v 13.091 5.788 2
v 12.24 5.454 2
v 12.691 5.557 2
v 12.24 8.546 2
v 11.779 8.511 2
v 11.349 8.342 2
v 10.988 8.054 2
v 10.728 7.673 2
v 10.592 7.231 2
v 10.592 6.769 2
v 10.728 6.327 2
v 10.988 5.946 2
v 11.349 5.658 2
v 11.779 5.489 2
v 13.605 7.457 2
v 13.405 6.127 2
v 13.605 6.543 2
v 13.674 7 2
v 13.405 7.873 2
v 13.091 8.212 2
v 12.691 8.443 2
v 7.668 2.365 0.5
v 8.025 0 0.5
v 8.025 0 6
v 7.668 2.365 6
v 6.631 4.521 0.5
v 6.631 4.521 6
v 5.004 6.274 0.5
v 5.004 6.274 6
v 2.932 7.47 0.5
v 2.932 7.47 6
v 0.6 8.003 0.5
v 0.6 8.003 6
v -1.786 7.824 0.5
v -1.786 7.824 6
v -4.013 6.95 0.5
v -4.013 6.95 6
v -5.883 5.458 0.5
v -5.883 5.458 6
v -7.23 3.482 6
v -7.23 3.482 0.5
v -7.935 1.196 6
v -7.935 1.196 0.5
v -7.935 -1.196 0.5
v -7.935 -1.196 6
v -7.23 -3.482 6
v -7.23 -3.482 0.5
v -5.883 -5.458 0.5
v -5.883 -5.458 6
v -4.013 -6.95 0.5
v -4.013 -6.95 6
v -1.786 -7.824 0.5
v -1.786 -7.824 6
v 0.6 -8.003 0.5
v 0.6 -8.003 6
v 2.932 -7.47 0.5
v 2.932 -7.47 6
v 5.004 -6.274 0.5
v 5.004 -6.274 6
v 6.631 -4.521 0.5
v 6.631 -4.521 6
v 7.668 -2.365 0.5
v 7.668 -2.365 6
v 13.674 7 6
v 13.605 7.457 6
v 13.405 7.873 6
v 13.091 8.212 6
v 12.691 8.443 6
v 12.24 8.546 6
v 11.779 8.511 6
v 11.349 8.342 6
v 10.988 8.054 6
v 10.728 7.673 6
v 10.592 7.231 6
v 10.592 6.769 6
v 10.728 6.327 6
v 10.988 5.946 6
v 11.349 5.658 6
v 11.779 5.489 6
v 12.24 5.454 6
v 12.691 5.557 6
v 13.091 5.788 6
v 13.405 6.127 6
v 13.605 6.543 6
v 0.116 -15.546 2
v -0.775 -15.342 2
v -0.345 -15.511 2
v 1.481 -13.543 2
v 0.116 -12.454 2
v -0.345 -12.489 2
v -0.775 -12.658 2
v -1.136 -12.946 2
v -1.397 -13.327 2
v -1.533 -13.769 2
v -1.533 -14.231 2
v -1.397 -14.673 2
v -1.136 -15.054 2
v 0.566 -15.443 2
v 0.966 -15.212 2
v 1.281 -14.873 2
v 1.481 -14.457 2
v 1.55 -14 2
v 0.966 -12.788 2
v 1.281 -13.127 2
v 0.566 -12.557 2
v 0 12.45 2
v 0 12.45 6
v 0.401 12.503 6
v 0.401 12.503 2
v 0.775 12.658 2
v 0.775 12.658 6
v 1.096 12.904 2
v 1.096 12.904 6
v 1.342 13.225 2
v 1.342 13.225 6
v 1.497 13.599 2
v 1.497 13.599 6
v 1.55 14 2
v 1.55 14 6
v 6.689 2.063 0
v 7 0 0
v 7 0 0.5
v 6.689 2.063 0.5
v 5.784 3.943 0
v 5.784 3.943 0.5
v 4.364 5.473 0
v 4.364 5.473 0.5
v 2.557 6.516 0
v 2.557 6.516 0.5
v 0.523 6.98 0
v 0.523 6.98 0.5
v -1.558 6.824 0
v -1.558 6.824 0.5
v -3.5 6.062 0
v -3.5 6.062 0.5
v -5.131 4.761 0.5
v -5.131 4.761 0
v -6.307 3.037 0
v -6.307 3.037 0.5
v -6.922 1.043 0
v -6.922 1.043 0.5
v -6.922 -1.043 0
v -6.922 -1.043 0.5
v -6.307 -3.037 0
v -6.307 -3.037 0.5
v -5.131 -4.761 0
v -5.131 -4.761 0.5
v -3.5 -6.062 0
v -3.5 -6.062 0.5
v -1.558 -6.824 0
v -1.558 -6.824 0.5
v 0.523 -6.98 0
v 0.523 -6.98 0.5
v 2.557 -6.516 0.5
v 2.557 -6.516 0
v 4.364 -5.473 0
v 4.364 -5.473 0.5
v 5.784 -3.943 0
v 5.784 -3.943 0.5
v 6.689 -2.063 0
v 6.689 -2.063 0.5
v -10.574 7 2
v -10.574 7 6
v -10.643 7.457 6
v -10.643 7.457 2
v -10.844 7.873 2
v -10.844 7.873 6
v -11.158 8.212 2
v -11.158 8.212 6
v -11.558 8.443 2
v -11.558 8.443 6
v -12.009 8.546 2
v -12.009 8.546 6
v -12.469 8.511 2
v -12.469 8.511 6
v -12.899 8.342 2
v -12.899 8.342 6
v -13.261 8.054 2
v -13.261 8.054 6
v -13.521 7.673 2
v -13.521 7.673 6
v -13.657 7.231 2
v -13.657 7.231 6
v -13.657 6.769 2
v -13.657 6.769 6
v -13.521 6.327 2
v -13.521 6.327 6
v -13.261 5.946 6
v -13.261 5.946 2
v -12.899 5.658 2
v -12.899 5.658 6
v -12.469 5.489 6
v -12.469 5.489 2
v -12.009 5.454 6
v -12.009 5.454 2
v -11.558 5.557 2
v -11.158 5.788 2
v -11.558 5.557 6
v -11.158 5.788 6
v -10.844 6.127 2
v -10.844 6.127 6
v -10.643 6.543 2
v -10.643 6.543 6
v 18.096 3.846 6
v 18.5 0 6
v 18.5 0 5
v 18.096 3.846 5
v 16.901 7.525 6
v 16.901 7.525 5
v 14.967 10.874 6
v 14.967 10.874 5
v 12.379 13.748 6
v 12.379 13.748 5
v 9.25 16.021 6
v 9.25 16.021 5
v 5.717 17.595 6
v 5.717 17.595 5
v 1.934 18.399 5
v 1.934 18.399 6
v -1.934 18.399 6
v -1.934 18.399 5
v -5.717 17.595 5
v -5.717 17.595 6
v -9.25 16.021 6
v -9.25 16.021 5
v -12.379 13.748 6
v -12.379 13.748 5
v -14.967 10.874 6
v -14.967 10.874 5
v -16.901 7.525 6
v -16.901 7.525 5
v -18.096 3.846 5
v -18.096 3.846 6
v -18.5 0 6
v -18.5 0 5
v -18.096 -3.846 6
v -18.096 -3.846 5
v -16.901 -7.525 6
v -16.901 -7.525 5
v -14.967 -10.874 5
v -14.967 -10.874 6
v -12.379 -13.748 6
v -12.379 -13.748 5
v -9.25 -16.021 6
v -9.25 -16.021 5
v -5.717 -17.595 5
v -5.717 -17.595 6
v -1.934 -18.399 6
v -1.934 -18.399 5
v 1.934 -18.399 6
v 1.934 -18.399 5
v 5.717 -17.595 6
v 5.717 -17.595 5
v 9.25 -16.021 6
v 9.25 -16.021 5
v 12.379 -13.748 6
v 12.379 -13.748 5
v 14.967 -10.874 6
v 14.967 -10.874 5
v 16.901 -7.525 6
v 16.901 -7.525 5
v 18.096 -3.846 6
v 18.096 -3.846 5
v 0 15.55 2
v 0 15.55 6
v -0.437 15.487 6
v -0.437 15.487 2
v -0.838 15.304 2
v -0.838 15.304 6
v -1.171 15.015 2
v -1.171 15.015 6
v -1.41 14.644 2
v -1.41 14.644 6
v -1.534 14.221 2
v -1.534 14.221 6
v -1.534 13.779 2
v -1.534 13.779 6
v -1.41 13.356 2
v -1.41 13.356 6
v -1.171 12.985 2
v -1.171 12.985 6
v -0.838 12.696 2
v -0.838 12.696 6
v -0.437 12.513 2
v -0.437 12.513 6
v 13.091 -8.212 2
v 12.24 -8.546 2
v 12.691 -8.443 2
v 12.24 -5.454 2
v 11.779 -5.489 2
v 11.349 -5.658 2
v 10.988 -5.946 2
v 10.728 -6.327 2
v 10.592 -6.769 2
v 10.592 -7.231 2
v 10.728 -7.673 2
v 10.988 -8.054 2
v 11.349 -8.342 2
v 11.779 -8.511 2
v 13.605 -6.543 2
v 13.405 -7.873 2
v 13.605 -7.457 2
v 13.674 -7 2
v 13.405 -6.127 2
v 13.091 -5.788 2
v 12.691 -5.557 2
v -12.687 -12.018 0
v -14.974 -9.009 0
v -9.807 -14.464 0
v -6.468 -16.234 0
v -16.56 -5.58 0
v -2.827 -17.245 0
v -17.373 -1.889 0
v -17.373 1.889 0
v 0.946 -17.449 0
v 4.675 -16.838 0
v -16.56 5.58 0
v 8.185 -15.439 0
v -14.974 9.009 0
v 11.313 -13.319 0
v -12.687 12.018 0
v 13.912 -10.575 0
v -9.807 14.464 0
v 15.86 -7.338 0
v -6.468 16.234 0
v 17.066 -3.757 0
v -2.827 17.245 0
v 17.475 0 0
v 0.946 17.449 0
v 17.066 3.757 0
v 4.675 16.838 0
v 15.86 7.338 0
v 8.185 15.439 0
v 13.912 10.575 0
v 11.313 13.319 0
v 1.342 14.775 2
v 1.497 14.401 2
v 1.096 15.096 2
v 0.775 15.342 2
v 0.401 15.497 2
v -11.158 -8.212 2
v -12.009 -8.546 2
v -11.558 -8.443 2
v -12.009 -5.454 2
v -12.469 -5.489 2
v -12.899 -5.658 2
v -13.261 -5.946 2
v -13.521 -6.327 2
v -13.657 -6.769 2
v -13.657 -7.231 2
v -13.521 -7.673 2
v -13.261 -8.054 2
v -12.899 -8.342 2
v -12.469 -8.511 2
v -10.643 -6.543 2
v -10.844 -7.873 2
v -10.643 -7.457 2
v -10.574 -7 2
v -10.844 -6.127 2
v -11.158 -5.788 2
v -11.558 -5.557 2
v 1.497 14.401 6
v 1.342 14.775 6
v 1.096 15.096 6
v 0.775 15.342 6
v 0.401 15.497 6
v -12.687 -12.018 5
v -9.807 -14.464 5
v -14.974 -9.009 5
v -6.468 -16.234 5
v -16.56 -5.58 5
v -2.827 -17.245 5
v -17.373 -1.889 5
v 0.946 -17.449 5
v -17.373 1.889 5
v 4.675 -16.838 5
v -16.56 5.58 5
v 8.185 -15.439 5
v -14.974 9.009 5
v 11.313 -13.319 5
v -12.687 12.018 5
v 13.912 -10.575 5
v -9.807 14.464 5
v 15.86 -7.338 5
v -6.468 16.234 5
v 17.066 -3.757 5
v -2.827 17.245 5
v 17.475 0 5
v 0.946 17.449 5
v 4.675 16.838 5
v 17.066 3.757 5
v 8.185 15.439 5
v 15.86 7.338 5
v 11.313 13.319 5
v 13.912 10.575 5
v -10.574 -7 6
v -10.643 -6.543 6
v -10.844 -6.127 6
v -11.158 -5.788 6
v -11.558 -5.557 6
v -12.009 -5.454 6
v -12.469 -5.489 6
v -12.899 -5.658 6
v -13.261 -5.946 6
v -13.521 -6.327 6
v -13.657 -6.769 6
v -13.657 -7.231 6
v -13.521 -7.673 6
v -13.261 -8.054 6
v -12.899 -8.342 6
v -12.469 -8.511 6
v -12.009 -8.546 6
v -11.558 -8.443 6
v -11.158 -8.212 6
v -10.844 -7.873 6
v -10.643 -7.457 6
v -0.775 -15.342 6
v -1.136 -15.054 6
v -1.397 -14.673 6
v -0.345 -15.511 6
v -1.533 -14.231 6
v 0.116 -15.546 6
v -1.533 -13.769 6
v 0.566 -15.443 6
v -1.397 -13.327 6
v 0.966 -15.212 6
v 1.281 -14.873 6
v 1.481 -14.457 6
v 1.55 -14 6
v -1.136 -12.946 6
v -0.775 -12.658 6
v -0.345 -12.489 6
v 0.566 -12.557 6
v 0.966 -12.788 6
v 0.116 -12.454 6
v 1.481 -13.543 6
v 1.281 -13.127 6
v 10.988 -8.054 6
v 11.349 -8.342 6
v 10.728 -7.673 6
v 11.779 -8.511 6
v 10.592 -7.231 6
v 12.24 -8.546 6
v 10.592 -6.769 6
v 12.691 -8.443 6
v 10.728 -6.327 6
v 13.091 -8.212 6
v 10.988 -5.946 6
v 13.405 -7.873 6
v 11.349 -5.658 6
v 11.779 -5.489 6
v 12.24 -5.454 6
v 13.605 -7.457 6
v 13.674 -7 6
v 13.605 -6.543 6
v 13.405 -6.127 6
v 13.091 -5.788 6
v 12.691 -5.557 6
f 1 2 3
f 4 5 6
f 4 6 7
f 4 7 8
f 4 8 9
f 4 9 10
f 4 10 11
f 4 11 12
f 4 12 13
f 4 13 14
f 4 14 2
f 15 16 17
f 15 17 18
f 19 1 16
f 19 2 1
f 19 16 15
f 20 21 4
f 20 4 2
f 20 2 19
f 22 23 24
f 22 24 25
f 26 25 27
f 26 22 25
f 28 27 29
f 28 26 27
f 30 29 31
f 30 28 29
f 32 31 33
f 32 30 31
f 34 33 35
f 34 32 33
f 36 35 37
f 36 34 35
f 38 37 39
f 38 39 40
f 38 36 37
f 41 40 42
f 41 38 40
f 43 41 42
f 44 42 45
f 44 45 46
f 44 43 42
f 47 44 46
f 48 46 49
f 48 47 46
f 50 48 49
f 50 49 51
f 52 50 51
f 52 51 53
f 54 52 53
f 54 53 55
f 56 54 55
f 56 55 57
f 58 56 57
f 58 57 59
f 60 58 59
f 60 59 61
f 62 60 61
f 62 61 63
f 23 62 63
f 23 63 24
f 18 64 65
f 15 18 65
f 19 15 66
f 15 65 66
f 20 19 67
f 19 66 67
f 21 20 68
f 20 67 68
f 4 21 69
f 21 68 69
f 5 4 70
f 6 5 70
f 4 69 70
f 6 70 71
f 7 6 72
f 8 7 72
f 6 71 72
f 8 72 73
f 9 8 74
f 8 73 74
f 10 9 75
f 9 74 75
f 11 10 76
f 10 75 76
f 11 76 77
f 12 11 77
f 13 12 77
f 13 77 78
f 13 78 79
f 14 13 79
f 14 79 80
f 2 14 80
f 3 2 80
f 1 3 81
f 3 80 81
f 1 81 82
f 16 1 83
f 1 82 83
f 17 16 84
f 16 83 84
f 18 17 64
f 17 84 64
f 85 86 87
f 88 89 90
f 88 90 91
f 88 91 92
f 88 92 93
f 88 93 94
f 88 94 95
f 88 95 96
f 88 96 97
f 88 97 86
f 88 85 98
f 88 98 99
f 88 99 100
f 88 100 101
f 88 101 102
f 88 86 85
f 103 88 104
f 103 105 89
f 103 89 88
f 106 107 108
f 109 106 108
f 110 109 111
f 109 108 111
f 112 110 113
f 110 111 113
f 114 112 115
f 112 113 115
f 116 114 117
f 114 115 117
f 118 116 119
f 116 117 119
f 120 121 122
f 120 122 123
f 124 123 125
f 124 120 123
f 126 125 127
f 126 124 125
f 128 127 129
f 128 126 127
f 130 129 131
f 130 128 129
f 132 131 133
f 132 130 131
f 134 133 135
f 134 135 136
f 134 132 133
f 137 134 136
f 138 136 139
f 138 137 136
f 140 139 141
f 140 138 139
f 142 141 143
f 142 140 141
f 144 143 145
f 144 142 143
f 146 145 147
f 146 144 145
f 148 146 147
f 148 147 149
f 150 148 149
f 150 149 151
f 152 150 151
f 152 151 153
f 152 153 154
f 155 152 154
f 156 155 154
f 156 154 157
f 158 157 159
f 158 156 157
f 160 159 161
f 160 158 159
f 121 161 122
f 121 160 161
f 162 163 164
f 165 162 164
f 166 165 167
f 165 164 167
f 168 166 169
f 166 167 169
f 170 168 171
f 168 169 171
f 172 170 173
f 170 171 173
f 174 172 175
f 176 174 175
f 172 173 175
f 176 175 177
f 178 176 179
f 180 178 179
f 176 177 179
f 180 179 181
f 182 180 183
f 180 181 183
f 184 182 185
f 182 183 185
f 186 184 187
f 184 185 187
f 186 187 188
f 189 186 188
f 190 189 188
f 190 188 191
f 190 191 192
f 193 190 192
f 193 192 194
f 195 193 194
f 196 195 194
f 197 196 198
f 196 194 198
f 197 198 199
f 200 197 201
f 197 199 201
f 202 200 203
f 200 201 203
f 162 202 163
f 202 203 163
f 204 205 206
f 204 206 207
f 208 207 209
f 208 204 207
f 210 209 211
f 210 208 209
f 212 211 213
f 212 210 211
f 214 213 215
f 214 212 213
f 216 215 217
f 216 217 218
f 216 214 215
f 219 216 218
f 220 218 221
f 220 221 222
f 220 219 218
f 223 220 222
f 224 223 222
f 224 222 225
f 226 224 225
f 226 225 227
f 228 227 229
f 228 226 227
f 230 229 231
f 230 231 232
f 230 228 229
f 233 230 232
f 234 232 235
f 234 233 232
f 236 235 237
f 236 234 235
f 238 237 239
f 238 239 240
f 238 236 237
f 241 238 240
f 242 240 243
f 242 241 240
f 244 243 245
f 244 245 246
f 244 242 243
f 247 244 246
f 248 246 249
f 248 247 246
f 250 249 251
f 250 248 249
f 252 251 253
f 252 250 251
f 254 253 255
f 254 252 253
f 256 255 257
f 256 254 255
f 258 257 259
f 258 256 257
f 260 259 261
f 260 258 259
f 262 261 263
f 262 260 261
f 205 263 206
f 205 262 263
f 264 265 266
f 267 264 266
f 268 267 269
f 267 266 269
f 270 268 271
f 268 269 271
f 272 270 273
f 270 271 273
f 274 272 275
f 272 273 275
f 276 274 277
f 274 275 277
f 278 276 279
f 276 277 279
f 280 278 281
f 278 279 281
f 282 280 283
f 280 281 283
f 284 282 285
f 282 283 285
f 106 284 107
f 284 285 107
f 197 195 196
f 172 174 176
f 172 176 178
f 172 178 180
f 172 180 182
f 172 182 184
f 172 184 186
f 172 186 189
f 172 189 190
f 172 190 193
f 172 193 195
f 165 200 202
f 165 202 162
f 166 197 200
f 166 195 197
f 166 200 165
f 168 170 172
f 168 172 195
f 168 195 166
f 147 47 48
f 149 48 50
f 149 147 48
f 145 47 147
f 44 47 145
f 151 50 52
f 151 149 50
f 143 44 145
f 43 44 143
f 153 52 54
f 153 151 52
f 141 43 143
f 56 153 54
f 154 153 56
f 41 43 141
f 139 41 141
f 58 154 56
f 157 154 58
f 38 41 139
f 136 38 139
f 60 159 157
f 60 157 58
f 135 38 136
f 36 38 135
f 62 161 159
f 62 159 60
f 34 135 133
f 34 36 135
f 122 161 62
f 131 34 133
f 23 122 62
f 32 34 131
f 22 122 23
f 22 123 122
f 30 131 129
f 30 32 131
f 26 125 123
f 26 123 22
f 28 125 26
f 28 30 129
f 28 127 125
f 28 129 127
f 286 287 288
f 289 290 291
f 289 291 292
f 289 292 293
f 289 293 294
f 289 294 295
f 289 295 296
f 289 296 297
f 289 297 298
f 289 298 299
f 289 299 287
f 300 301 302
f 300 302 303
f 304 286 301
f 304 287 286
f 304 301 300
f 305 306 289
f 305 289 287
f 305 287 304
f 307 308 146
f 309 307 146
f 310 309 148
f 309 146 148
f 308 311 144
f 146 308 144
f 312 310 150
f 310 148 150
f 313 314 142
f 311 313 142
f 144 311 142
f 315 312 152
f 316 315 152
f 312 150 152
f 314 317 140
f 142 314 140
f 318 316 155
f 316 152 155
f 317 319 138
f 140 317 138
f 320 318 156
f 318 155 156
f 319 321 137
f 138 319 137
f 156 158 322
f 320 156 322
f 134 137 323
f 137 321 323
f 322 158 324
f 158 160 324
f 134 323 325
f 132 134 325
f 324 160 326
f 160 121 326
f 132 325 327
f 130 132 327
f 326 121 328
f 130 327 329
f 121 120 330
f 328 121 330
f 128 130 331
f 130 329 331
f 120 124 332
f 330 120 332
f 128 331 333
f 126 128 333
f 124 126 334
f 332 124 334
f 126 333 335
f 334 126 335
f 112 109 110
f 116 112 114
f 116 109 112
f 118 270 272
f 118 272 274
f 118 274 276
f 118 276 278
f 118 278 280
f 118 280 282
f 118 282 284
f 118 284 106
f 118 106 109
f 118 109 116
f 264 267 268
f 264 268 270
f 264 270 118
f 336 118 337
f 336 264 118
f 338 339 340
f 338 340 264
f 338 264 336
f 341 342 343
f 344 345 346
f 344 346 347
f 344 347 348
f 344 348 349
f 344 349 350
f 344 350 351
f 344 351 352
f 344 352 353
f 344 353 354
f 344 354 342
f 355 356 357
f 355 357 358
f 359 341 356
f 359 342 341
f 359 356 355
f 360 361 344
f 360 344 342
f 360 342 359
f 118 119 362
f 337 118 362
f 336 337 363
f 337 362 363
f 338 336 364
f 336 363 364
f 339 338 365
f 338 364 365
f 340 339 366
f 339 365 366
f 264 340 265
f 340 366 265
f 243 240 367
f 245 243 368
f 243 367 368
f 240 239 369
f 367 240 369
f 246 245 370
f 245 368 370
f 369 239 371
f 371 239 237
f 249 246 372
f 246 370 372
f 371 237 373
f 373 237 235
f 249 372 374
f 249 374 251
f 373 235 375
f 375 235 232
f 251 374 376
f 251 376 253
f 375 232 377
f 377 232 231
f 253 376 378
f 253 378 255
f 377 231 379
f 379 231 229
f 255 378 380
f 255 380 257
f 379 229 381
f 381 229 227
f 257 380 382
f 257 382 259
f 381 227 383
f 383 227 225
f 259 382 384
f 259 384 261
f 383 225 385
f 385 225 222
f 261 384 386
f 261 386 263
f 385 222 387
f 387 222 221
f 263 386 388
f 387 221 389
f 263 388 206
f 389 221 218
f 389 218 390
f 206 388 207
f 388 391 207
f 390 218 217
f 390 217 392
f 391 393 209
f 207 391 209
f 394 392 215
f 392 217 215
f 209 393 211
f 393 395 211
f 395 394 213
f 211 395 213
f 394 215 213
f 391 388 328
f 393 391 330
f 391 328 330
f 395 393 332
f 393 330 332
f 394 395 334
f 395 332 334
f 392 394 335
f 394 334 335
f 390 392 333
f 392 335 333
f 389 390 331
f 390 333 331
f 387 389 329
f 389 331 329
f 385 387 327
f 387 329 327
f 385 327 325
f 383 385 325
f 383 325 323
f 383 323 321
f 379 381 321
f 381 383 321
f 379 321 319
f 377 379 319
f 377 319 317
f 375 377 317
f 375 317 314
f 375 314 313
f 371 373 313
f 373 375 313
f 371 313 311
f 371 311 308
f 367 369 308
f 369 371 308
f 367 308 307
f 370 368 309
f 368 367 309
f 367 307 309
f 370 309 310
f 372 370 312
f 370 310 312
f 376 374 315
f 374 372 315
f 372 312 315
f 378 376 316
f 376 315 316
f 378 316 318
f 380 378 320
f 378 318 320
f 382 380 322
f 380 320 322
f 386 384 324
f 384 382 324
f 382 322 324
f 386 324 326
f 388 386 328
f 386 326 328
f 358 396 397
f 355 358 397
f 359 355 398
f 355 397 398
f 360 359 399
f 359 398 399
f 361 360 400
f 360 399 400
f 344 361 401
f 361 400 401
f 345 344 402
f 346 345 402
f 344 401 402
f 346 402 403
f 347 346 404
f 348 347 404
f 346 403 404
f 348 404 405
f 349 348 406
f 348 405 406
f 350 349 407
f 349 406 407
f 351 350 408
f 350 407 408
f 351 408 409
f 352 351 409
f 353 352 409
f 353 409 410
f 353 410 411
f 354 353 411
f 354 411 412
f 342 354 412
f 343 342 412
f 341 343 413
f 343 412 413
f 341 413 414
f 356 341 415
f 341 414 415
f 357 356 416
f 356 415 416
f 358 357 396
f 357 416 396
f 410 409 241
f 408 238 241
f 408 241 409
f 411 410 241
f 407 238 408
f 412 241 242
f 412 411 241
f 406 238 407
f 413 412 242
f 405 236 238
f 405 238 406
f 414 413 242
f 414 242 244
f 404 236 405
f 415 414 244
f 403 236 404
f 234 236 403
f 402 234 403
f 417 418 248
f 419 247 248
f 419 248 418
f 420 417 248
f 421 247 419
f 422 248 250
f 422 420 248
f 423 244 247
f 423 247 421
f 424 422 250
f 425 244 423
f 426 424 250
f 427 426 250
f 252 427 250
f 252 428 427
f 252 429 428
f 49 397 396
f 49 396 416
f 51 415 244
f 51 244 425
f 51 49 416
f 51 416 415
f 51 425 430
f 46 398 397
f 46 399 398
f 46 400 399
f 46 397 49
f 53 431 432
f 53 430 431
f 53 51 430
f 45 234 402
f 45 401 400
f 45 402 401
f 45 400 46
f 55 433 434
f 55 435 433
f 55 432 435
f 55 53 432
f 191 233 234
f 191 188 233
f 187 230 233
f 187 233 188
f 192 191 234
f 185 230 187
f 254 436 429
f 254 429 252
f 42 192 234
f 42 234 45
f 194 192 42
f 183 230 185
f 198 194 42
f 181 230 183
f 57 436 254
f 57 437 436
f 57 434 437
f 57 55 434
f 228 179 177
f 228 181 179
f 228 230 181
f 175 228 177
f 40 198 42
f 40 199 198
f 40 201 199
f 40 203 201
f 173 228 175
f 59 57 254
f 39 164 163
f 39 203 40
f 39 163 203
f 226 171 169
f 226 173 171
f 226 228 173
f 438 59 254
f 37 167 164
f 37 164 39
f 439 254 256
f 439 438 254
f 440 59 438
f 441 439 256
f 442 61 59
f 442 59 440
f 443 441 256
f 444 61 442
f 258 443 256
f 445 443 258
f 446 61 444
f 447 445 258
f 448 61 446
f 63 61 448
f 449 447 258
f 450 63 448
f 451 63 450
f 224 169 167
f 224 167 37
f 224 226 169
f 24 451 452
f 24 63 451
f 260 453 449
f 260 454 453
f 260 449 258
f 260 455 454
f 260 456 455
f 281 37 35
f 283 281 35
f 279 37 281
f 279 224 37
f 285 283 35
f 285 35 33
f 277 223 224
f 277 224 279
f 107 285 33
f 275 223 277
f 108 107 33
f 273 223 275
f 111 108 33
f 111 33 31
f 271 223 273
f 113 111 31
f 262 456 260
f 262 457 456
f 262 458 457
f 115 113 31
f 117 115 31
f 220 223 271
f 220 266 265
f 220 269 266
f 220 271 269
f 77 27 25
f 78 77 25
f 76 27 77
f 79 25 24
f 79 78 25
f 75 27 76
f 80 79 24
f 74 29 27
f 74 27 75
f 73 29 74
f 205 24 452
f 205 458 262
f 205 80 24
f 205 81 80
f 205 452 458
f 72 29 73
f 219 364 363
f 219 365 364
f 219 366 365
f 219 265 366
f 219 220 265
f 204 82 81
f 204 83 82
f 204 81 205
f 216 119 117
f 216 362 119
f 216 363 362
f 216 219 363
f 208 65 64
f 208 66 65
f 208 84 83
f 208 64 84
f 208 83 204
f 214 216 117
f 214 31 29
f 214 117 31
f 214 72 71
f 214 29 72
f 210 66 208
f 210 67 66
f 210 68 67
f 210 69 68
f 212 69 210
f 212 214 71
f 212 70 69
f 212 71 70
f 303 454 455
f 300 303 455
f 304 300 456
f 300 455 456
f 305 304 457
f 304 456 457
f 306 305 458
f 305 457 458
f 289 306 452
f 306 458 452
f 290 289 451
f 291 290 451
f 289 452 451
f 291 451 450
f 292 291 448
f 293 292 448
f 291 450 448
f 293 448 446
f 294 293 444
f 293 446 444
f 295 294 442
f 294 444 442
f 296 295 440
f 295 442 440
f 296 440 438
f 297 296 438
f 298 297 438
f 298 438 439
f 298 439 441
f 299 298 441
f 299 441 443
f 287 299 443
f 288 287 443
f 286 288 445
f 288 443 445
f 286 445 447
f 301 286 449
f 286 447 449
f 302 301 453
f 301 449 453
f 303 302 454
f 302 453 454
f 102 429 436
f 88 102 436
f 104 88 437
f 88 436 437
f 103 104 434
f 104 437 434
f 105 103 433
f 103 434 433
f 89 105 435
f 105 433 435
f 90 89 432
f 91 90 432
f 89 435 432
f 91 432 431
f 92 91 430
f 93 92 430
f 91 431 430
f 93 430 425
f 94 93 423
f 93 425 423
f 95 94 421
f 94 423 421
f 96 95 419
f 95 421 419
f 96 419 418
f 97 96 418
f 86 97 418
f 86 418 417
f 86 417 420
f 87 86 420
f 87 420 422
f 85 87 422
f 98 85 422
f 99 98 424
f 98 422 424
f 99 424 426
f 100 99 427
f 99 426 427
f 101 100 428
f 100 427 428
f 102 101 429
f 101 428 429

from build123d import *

# Parameters (mm, degrees)
SKETCH1_R           = 17.475
SKETCH1_R_2         = 8.025
BOSS_EXTRUDE1_DEPTH = 6
CUT_EXTRUDE1_START  = 6
SKETCH1_3_R         = 1.55
CUT_EXTRUDE1_DEPTH  = 4
BOSS_EXTRUDE2_START = 6
SKETCH2_R           = 18.5
SKETCH2_R_2         = 17.25
BOSS_EXTRUDE2_DEPTH = 1
SKETCH2_3_R         = 8.25
SKETCH2_3_R_2       = 7
BOSS_EXTRUDE3_DEPTH = 0.5


with BuildPart() as part:
    # Sketch1 → Boss-Extrude1 (new body)
    with BuildSketch(Plane.XY):
        Circle(SKETCH1_R)
        Circle(SKETCH1_R_2, mode=Mode.SUBTRACT)
    extrude(amount=BOSS_EXTRUDE1_DEPTH)

    # Sketch1<3> → Cut-Extrude1 (cut)
    with BuildSketch(Plane.XY.offset(CUT_EXTRUDE1_START)):
        with Locations((-12.124355653, 7)):
            Circle(SKETCH1_3_R)
        with BuildLine():
            ThreePointArc((0, 15.55), (-1.55, 14), (0, 12.45))
            Line((0, 12.45), (0, 15.55))
        make_face()
        with BuildLine():
            Line((0, 15.55), (0, 12.45))
            ThreePointArc((0, 12.45), (1.096015511, 12.903984489), (1.55, 14))
            ThreePointArc((1.55, 14), (1.096015511, 15.096015511), (0, 15.55))
        make_face()
        with Locations((12.124355653, 7)):
            Circle(SKETCH1_3_R)
        with Locations((12.124355653, -7)):
            Circle(SKETCH1_3_R)
        with Locations((0, -14)):
            Circle(SKETCH1_3_R)
        with Locations((-12.124355653, -7)):
            Circle(SKETCH1_3_R)
    extrude(amount=-CUT_EXTRUDE1_DEPTH, mode=Mode.SUBTRACT)

    # Sketch2 → Boss-Extrude2 (add)
    with BuildSketch(Plane.XY.offset(BOSS_EXTRUDE2_START)):
        Circle(SKETCH2_R)
        Circle(SKETCH2_R_2, mode=Mode.SUBTRACT)
    extrude(amount=-BOSS_EXTRUDE2_DEPTH)

    # Sketch2<3> → Boss-Extrude3 (add)
    with BuildSketch(Plane.XY):
        Circle(SKETCH2_3_R)
        Circle(SKETCH2_3_R_2, mode=Mode.SUBTRACT)
    extrude(amount=BOSS_EXTRUDE3_DEPTH)


solid = part.part
